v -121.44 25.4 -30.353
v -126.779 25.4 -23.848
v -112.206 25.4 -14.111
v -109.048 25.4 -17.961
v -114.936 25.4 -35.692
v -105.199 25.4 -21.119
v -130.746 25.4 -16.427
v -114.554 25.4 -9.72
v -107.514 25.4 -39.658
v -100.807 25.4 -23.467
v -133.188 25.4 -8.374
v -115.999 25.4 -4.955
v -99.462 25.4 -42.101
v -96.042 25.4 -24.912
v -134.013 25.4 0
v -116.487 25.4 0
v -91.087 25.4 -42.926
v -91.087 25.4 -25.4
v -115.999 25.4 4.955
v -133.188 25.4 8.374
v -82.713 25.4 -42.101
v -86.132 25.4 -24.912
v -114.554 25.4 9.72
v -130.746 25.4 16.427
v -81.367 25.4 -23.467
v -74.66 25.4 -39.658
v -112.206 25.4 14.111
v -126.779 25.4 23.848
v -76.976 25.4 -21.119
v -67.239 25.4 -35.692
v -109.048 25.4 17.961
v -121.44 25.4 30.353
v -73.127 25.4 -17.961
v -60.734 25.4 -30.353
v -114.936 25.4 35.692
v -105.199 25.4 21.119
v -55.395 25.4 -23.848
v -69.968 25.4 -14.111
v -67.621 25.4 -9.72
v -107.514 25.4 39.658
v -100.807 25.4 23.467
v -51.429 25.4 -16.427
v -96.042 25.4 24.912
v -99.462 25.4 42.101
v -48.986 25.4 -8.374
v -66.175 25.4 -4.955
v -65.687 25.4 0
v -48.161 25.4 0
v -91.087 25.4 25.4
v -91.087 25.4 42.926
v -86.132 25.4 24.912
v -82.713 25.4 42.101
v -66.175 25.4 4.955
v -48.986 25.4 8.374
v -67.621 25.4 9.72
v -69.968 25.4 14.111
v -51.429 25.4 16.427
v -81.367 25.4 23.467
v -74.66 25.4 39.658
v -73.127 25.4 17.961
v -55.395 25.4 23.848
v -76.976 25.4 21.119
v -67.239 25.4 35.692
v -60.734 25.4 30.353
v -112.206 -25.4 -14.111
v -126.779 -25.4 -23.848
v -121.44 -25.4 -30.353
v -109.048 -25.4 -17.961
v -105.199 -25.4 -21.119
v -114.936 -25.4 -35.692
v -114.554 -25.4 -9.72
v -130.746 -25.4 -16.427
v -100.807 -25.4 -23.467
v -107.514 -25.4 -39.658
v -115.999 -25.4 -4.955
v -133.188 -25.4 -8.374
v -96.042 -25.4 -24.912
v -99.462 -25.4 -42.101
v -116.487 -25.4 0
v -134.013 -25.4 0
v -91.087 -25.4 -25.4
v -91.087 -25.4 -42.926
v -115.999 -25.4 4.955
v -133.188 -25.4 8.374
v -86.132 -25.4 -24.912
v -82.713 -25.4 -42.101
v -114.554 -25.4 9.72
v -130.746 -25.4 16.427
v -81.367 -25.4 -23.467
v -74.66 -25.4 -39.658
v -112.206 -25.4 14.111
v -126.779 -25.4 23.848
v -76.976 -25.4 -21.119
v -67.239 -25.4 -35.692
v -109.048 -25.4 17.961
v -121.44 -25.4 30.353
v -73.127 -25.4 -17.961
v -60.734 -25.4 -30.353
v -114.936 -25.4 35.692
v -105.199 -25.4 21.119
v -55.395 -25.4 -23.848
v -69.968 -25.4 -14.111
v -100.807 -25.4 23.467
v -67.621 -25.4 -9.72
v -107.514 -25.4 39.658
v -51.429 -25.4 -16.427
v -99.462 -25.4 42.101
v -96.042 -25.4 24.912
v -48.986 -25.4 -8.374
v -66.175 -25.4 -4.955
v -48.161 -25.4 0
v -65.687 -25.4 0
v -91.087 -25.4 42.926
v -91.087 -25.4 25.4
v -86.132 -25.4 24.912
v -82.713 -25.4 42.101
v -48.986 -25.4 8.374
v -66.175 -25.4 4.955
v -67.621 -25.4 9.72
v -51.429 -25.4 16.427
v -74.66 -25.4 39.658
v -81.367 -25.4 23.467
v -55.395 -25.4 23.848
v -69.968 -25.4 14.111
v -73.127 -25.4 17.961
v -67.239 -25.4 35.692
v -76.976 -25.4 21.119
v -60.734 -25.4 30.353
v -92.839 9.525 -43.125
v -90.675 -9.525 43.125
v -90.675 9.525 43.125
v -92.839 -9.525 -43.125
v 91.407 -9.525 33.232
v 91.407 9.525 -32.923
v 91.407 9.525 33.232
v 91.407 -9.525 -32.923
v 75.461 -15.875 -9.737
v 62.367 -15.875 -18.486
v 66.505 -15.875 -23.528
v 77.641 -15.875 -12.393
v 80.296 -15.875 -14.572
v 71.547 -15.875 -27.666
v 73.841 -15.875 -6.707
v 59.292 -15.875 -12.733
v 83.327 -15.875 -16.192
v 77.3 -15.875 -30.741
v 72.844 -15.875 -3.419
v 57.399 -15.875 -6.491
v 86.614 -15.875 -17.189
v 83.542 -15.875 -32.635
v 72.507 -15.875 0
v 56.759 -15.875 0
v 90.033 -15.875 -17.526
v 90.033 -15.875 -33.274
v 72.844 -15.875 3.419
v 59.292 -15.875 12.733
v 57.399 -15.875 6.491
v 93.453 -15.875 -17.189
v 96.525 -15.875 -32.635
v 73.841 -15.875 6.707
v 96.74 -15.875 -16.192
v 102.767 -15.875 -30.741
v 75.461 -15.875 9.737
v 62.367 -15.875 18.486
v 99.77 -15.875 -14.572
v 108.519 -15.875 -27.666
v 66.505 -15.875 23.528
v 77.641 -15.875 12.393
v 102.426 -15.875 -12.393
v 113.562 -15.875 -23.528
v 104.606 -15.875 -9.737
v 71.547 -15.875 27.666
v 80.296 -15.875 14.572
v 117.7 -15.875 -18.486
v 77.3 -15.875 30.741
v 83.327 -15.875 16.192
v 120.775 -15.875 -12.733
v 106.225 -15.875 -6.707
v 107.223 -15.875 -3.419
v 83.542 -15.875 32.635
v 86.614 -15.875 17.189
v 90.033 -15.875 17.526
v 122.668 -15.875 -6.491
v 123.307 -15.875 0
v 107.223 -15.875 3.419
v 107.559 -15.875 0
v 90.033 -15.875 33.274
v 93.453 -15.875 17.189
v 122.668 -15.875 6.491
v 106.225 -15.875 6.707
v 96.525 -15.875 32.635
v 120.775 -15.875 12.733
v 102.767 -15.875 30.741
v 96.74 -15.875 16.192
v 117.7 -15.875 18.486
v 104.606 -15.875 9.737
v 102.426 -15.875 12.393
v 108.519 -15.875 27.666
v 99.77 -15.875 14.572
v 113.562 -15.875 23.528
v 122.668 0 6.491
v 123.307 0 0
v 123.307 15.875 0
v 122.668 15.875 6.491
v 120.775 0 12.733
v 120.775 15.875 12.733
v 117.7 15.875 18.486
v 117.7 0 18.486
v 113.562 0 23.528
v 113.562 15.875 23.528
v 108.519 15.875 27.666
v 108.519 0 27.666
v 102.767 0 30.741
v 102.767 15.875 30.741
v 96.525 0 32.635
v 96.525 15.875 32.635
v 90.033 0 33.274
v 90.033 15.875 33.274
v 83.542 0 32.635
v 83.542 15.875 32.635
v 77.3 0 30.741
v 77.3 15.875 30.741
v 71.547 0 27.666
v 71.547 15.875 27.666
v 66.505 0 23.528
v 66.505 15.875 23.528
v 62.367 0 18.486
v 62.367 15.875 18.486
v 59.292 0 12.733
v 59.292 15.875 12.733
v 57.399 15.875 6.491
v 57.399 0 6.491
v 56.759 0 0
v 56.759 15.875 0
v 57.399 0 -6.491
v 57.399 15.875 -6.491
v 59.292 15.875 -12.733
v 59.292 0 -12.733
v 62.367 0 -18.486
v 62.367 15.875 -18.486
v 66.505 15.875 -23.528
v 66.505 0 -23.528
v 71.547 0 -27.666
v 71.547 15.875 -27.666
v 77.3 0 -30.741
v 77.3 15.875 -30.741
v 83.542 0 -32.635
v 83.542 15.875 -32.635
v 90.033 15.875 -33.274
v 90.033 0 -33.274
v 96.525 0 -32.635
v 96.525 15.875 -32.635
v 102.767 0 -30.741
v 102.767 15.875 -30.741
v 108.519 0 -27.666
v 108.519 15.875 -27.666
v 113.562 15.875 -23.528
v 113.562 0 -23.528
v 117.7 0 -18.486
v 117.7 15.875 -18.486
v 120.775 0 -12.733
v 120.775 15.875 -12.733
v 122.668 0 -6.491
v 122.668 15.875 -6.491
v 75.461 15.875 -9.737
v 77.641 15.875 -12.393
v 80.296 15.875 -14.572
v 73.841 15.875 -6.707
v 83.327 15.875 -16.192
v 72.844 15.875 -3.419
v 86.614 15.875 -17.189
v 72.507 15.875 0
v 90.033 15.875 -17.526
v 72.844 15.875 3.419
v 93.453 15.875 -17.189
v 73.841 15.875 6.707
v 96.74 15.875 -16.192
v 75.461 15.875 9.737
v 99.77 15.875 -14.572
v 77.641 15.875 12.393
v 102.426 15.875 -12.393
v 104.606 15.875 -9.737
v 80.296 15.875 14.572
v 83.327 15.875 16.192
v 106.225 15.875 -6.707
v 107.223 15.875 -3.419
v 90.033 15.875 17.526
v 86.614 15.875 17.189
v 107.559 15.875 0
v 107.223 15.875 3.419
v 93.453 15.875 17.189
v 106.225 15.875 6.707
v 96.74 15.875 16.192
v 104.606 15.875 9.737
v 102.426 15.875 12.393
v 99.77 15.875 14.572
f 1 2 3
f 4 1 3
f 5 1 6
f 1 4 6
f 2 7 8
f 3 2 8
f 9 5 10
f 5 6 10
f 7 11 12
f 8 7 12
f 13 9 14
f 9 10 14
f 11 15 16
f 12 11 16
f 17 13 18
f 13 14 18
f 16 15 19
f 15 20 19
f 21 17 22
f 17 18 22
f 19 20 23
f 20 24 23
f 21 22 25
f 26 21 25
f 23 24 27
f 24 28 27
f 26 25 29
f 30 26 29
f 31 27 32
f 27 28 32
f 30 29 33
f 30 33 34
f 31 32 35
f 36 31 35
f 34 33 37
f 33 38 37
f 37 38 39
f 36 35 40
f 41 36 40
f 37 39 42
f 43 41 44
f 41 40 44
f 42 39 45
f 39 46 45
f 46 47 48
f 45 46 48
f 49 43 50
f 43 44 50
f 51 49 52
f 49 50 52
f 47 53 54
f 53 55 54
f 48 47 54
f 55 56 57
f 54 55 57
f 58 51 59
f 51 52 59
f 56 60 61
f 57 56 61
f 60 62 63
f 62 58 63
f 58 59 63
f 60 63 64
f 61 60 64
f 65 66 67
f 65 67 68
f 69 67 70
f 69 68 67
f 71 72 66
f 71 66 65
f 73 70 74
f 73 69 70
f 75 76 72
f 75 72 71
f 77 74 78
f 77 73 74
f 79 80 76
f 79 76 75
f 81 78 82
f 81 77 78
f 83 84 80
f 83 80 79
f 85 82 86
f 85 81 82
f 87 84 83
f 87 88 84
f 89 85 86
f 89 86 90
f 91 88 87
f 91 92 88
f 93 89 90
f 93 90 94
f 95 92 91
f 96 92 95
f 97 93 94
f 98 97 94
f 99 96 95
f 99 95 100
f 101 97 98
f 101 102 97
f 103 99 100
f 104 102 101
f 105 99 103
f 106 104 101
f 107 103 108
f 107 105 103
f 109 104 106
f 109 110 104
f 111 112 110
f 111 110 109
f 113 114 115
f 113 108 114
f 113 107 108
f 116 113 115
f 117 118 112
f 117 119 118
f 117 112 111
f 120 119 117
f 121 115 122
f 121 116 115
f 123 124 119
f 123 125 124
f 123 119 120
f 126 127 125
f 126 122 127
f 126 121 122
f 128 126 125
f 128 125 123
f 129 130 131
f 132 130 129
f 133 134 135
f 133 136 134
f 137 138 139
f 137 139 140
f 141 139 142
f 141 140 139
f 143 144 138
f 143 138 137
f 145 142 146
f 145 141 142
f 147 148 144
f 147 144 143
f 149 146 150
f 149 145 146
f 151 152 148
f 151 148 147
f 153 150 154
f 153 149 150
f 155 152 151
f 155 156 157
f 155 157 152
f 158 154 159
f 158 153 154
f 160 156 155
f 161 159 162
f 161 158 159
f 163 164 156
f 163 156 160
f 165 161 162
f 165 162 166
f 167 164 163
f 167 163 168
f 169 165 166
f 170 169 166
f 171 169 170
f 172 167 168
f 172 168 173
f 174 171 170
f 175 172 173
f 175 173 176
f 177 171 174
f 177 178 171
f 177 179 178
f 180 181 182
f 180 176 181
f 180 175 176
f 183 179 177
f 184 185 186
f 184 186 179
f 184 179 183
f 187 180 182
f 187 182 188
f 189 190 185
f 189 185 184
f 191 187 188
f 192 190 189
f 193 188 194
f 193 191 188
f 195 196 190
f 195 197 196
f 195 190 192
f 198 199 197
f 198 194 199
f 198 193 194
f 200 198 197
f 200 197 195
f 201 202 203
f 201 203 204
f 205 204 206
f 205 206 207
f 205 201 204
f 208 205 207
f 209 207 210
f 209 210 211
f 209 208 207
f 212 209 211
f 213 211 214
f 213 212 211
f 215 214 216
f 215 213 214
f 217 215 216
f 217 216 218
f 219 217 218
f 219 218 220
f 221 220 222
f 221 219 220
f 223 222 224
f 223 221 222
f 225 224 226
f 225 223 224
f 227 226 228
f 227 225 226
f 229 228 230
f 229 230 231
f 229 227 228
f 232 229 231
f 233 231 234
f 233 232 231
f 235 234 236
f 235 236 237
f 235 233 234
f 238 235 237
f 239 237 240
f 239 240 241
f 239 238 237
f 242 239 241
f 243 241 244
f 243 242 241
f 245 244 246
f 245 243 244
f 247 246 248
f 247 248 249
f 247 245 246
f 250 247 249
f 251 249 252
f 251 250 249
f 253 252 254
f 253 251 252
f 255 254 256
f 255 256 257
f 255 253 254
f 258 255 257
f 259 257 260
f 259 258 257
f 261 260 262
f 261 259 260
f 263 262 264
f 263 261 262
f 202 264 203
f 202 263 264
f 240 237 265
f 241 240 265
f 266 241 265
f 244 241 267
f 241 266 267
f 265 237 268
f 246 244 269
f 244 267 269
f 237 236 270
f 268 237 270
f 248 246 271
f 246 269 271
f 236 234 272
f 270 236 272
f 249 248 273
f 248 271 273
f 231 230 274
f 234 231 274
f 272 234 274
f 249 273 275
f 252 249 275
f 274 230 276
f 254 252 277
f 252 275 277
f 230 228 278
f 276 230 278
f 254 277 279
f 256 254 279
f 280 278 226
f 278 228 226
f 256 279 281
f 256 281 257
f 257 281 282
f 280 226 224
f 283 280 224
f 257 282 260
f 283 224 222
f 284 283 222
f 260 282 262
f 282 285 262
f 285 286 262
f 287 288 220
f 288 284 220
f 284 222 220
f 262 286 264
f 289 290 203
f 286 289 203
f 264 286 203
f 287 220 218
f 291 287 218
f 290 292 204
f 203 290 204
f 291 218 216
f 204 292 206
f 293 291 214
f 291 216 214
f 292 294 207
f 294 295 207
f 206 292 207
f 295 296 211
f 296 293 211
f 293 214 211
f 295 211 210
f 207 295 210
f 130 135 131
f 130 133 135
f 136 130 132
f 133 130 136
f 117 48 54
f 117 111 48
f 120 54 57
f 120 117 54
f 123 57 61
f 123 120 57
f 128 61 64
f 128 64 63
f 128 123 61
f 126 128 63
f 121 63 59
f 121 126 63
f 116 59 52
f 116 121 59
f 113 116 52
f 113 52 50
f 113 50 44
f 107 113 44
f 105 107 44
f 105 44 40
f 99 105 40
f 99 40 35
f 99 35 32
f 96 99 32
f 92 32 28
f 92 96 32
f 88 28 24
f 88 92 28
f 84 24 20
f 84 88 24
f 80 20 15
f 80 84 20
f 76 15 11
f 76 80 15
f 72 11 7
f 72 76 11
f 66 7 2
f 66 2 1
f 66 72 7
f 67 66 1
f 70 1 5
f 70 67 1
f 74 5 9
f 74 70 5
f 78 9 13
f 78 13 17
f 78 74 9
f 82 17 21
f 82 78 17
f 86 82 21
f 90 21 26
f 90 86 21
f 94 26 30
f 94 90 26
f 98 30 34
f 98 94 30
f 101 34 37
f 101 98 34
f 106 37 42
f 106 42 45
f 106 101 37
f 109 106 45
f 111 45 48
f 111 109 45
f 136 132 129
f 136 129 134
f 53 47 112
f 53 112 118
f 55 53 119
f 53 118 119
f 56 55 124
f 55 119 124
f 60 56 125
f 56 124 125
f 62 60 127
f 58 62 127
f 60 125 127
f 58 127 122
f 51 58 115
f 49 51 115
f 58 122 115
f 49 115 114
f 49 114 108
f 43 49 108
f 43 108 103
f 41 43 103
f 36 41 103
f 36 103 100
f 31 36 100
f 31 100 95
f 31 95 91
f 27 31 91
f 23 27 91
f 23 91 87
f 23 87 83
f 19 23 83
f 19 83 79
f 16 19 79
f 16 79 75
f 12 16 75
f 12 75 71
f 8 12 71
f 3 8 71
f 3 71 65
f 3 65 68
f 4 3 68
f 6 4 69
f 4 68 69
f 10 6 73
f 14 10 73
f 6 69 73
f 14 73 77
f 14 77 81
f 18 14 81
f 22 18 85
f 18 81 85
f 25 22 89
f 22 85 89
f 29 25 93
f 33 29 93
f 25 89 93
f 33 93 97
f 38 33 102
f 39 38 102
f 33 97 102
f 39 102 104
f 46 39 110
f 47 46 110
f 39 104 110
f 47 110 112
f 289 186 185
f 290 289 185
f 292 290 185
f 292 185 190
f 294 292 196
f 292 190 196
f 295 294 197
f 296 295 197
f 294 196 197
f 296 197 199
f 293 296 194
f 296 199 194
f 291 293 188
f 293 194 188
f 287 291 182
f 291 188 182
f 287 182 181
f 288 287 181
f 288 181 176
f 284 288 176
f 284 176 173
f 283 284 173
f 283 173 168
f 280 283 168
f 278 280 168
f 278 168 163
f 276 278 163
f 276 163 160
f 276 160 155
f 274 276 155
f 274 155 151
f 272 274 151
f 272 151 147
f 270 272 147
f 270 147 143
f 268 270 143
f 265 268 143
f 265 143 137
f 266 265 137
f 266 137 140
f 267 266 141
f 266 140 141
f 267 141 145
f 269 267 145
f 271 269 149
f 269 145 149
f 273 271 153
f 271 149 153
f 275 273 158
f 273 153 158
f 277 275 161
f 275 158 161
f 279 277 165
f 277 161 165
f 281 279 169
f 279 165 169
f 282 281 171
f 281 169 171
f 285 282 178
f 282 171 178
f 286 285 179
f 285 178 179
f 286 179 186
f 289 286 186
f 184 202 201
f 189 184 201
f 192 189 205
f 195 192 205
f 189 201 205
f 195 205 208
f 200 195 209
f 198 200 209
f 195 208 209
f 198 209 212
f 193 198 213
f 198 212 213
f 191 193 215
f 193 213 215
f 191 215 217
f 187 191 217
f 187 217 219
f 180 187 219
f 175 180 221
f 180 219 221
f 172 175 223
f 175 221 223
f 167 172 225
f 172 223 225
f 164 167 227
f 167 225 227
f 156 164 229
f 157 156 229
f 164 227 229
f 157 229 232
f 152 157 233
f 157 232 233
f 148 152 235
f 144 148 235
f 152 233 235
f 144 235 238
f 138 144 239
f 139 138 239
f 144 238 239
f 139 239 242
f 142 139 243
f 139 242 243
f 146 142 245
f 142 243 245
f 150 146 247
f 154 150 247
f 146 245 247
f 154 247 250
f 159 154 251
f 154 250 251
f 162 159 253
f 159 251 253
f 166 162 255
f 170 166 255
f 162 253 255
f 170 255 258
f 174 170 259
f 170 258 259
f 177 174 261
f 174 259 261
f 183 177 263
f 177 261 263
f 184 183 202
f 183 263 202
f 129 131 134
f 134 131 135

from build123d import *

# Parameters (mm, degrees)
F0_R          = 42.926
F2_DEPTH      = 25.4
F2_DEPTH_BACK = 25.4
F1_R          = 33.274
F3_DEPTH      = 15.875
F3_DEPTH_BACK = 15.875
F5_DEPTH      = 9.525
F5_DEPTH_BACK = 9.525
F6_R          = 25.4
F7_DEPTH      = 132.39676
F8_R          = 17.526
F9_DEPTH      = 95.20603


with BuildPart() as f2:
    # F0 (on Front) → F2 (new body, two sides)
    with BuildSketch(Plane.XZ) as f2_sk:
        with Locations((-91.0871326923, 0)):
            Circle(F0_R)
    extrude(amount=F2_DEPTH)
    extrude(f2_sk.sketch, amount=-F2_DEPTH_BACK)

    # F6 (on face) → F7 (cut)
    with BuildSketch(Plane.XZ.offset(25.4)):
        with Locations((-91.0871326923, 0)):
            Circle(F6_R)
    extrude(amount=-F7_DEPTH, mode=Mode.SUBTRACT)


with BuildPart() as f3:
    # F1 (on Front) → F3 (new body, two sides)
    with BuildSketch(Plane.XZ) as f3_sk:
        with Locations((90.0334119797, 0)):
            Circle(F1_R)
    extrude(amount=-F3_DEPTH)
    extrude(f3_sk.sketch, amount=F3_DEPTH_BACK)

    # F8 (on face) → F9 (cut)
    with BuildSketch(Plane.XZ.offset(15.875)):
        with Locations((90.0334119797, 0)):
            Circle(F8_R)
    extrude(amount=-F9_DEPTH, mode=Mode.SUBTRACT)


with BuildPart() as f5:
    # F4 (on Front) → F5 (new body, two sides)
    with BuildSketch(Plane.XZ) as f5_sk:
        Polygon((91.4073139429, 33.2323312759), (-90.6749367714, 43.1247465312), (-92.8388983011, -43.1247465312), (91.4073139429, -32.9231917858), align=None)
    extrude(amount=F5_DEPTH)
    extrude(f5_sk.sketch, amount=-F5_DEPTH_BACK)


solid = Compound([f2.part, f3.part, f5.part])
